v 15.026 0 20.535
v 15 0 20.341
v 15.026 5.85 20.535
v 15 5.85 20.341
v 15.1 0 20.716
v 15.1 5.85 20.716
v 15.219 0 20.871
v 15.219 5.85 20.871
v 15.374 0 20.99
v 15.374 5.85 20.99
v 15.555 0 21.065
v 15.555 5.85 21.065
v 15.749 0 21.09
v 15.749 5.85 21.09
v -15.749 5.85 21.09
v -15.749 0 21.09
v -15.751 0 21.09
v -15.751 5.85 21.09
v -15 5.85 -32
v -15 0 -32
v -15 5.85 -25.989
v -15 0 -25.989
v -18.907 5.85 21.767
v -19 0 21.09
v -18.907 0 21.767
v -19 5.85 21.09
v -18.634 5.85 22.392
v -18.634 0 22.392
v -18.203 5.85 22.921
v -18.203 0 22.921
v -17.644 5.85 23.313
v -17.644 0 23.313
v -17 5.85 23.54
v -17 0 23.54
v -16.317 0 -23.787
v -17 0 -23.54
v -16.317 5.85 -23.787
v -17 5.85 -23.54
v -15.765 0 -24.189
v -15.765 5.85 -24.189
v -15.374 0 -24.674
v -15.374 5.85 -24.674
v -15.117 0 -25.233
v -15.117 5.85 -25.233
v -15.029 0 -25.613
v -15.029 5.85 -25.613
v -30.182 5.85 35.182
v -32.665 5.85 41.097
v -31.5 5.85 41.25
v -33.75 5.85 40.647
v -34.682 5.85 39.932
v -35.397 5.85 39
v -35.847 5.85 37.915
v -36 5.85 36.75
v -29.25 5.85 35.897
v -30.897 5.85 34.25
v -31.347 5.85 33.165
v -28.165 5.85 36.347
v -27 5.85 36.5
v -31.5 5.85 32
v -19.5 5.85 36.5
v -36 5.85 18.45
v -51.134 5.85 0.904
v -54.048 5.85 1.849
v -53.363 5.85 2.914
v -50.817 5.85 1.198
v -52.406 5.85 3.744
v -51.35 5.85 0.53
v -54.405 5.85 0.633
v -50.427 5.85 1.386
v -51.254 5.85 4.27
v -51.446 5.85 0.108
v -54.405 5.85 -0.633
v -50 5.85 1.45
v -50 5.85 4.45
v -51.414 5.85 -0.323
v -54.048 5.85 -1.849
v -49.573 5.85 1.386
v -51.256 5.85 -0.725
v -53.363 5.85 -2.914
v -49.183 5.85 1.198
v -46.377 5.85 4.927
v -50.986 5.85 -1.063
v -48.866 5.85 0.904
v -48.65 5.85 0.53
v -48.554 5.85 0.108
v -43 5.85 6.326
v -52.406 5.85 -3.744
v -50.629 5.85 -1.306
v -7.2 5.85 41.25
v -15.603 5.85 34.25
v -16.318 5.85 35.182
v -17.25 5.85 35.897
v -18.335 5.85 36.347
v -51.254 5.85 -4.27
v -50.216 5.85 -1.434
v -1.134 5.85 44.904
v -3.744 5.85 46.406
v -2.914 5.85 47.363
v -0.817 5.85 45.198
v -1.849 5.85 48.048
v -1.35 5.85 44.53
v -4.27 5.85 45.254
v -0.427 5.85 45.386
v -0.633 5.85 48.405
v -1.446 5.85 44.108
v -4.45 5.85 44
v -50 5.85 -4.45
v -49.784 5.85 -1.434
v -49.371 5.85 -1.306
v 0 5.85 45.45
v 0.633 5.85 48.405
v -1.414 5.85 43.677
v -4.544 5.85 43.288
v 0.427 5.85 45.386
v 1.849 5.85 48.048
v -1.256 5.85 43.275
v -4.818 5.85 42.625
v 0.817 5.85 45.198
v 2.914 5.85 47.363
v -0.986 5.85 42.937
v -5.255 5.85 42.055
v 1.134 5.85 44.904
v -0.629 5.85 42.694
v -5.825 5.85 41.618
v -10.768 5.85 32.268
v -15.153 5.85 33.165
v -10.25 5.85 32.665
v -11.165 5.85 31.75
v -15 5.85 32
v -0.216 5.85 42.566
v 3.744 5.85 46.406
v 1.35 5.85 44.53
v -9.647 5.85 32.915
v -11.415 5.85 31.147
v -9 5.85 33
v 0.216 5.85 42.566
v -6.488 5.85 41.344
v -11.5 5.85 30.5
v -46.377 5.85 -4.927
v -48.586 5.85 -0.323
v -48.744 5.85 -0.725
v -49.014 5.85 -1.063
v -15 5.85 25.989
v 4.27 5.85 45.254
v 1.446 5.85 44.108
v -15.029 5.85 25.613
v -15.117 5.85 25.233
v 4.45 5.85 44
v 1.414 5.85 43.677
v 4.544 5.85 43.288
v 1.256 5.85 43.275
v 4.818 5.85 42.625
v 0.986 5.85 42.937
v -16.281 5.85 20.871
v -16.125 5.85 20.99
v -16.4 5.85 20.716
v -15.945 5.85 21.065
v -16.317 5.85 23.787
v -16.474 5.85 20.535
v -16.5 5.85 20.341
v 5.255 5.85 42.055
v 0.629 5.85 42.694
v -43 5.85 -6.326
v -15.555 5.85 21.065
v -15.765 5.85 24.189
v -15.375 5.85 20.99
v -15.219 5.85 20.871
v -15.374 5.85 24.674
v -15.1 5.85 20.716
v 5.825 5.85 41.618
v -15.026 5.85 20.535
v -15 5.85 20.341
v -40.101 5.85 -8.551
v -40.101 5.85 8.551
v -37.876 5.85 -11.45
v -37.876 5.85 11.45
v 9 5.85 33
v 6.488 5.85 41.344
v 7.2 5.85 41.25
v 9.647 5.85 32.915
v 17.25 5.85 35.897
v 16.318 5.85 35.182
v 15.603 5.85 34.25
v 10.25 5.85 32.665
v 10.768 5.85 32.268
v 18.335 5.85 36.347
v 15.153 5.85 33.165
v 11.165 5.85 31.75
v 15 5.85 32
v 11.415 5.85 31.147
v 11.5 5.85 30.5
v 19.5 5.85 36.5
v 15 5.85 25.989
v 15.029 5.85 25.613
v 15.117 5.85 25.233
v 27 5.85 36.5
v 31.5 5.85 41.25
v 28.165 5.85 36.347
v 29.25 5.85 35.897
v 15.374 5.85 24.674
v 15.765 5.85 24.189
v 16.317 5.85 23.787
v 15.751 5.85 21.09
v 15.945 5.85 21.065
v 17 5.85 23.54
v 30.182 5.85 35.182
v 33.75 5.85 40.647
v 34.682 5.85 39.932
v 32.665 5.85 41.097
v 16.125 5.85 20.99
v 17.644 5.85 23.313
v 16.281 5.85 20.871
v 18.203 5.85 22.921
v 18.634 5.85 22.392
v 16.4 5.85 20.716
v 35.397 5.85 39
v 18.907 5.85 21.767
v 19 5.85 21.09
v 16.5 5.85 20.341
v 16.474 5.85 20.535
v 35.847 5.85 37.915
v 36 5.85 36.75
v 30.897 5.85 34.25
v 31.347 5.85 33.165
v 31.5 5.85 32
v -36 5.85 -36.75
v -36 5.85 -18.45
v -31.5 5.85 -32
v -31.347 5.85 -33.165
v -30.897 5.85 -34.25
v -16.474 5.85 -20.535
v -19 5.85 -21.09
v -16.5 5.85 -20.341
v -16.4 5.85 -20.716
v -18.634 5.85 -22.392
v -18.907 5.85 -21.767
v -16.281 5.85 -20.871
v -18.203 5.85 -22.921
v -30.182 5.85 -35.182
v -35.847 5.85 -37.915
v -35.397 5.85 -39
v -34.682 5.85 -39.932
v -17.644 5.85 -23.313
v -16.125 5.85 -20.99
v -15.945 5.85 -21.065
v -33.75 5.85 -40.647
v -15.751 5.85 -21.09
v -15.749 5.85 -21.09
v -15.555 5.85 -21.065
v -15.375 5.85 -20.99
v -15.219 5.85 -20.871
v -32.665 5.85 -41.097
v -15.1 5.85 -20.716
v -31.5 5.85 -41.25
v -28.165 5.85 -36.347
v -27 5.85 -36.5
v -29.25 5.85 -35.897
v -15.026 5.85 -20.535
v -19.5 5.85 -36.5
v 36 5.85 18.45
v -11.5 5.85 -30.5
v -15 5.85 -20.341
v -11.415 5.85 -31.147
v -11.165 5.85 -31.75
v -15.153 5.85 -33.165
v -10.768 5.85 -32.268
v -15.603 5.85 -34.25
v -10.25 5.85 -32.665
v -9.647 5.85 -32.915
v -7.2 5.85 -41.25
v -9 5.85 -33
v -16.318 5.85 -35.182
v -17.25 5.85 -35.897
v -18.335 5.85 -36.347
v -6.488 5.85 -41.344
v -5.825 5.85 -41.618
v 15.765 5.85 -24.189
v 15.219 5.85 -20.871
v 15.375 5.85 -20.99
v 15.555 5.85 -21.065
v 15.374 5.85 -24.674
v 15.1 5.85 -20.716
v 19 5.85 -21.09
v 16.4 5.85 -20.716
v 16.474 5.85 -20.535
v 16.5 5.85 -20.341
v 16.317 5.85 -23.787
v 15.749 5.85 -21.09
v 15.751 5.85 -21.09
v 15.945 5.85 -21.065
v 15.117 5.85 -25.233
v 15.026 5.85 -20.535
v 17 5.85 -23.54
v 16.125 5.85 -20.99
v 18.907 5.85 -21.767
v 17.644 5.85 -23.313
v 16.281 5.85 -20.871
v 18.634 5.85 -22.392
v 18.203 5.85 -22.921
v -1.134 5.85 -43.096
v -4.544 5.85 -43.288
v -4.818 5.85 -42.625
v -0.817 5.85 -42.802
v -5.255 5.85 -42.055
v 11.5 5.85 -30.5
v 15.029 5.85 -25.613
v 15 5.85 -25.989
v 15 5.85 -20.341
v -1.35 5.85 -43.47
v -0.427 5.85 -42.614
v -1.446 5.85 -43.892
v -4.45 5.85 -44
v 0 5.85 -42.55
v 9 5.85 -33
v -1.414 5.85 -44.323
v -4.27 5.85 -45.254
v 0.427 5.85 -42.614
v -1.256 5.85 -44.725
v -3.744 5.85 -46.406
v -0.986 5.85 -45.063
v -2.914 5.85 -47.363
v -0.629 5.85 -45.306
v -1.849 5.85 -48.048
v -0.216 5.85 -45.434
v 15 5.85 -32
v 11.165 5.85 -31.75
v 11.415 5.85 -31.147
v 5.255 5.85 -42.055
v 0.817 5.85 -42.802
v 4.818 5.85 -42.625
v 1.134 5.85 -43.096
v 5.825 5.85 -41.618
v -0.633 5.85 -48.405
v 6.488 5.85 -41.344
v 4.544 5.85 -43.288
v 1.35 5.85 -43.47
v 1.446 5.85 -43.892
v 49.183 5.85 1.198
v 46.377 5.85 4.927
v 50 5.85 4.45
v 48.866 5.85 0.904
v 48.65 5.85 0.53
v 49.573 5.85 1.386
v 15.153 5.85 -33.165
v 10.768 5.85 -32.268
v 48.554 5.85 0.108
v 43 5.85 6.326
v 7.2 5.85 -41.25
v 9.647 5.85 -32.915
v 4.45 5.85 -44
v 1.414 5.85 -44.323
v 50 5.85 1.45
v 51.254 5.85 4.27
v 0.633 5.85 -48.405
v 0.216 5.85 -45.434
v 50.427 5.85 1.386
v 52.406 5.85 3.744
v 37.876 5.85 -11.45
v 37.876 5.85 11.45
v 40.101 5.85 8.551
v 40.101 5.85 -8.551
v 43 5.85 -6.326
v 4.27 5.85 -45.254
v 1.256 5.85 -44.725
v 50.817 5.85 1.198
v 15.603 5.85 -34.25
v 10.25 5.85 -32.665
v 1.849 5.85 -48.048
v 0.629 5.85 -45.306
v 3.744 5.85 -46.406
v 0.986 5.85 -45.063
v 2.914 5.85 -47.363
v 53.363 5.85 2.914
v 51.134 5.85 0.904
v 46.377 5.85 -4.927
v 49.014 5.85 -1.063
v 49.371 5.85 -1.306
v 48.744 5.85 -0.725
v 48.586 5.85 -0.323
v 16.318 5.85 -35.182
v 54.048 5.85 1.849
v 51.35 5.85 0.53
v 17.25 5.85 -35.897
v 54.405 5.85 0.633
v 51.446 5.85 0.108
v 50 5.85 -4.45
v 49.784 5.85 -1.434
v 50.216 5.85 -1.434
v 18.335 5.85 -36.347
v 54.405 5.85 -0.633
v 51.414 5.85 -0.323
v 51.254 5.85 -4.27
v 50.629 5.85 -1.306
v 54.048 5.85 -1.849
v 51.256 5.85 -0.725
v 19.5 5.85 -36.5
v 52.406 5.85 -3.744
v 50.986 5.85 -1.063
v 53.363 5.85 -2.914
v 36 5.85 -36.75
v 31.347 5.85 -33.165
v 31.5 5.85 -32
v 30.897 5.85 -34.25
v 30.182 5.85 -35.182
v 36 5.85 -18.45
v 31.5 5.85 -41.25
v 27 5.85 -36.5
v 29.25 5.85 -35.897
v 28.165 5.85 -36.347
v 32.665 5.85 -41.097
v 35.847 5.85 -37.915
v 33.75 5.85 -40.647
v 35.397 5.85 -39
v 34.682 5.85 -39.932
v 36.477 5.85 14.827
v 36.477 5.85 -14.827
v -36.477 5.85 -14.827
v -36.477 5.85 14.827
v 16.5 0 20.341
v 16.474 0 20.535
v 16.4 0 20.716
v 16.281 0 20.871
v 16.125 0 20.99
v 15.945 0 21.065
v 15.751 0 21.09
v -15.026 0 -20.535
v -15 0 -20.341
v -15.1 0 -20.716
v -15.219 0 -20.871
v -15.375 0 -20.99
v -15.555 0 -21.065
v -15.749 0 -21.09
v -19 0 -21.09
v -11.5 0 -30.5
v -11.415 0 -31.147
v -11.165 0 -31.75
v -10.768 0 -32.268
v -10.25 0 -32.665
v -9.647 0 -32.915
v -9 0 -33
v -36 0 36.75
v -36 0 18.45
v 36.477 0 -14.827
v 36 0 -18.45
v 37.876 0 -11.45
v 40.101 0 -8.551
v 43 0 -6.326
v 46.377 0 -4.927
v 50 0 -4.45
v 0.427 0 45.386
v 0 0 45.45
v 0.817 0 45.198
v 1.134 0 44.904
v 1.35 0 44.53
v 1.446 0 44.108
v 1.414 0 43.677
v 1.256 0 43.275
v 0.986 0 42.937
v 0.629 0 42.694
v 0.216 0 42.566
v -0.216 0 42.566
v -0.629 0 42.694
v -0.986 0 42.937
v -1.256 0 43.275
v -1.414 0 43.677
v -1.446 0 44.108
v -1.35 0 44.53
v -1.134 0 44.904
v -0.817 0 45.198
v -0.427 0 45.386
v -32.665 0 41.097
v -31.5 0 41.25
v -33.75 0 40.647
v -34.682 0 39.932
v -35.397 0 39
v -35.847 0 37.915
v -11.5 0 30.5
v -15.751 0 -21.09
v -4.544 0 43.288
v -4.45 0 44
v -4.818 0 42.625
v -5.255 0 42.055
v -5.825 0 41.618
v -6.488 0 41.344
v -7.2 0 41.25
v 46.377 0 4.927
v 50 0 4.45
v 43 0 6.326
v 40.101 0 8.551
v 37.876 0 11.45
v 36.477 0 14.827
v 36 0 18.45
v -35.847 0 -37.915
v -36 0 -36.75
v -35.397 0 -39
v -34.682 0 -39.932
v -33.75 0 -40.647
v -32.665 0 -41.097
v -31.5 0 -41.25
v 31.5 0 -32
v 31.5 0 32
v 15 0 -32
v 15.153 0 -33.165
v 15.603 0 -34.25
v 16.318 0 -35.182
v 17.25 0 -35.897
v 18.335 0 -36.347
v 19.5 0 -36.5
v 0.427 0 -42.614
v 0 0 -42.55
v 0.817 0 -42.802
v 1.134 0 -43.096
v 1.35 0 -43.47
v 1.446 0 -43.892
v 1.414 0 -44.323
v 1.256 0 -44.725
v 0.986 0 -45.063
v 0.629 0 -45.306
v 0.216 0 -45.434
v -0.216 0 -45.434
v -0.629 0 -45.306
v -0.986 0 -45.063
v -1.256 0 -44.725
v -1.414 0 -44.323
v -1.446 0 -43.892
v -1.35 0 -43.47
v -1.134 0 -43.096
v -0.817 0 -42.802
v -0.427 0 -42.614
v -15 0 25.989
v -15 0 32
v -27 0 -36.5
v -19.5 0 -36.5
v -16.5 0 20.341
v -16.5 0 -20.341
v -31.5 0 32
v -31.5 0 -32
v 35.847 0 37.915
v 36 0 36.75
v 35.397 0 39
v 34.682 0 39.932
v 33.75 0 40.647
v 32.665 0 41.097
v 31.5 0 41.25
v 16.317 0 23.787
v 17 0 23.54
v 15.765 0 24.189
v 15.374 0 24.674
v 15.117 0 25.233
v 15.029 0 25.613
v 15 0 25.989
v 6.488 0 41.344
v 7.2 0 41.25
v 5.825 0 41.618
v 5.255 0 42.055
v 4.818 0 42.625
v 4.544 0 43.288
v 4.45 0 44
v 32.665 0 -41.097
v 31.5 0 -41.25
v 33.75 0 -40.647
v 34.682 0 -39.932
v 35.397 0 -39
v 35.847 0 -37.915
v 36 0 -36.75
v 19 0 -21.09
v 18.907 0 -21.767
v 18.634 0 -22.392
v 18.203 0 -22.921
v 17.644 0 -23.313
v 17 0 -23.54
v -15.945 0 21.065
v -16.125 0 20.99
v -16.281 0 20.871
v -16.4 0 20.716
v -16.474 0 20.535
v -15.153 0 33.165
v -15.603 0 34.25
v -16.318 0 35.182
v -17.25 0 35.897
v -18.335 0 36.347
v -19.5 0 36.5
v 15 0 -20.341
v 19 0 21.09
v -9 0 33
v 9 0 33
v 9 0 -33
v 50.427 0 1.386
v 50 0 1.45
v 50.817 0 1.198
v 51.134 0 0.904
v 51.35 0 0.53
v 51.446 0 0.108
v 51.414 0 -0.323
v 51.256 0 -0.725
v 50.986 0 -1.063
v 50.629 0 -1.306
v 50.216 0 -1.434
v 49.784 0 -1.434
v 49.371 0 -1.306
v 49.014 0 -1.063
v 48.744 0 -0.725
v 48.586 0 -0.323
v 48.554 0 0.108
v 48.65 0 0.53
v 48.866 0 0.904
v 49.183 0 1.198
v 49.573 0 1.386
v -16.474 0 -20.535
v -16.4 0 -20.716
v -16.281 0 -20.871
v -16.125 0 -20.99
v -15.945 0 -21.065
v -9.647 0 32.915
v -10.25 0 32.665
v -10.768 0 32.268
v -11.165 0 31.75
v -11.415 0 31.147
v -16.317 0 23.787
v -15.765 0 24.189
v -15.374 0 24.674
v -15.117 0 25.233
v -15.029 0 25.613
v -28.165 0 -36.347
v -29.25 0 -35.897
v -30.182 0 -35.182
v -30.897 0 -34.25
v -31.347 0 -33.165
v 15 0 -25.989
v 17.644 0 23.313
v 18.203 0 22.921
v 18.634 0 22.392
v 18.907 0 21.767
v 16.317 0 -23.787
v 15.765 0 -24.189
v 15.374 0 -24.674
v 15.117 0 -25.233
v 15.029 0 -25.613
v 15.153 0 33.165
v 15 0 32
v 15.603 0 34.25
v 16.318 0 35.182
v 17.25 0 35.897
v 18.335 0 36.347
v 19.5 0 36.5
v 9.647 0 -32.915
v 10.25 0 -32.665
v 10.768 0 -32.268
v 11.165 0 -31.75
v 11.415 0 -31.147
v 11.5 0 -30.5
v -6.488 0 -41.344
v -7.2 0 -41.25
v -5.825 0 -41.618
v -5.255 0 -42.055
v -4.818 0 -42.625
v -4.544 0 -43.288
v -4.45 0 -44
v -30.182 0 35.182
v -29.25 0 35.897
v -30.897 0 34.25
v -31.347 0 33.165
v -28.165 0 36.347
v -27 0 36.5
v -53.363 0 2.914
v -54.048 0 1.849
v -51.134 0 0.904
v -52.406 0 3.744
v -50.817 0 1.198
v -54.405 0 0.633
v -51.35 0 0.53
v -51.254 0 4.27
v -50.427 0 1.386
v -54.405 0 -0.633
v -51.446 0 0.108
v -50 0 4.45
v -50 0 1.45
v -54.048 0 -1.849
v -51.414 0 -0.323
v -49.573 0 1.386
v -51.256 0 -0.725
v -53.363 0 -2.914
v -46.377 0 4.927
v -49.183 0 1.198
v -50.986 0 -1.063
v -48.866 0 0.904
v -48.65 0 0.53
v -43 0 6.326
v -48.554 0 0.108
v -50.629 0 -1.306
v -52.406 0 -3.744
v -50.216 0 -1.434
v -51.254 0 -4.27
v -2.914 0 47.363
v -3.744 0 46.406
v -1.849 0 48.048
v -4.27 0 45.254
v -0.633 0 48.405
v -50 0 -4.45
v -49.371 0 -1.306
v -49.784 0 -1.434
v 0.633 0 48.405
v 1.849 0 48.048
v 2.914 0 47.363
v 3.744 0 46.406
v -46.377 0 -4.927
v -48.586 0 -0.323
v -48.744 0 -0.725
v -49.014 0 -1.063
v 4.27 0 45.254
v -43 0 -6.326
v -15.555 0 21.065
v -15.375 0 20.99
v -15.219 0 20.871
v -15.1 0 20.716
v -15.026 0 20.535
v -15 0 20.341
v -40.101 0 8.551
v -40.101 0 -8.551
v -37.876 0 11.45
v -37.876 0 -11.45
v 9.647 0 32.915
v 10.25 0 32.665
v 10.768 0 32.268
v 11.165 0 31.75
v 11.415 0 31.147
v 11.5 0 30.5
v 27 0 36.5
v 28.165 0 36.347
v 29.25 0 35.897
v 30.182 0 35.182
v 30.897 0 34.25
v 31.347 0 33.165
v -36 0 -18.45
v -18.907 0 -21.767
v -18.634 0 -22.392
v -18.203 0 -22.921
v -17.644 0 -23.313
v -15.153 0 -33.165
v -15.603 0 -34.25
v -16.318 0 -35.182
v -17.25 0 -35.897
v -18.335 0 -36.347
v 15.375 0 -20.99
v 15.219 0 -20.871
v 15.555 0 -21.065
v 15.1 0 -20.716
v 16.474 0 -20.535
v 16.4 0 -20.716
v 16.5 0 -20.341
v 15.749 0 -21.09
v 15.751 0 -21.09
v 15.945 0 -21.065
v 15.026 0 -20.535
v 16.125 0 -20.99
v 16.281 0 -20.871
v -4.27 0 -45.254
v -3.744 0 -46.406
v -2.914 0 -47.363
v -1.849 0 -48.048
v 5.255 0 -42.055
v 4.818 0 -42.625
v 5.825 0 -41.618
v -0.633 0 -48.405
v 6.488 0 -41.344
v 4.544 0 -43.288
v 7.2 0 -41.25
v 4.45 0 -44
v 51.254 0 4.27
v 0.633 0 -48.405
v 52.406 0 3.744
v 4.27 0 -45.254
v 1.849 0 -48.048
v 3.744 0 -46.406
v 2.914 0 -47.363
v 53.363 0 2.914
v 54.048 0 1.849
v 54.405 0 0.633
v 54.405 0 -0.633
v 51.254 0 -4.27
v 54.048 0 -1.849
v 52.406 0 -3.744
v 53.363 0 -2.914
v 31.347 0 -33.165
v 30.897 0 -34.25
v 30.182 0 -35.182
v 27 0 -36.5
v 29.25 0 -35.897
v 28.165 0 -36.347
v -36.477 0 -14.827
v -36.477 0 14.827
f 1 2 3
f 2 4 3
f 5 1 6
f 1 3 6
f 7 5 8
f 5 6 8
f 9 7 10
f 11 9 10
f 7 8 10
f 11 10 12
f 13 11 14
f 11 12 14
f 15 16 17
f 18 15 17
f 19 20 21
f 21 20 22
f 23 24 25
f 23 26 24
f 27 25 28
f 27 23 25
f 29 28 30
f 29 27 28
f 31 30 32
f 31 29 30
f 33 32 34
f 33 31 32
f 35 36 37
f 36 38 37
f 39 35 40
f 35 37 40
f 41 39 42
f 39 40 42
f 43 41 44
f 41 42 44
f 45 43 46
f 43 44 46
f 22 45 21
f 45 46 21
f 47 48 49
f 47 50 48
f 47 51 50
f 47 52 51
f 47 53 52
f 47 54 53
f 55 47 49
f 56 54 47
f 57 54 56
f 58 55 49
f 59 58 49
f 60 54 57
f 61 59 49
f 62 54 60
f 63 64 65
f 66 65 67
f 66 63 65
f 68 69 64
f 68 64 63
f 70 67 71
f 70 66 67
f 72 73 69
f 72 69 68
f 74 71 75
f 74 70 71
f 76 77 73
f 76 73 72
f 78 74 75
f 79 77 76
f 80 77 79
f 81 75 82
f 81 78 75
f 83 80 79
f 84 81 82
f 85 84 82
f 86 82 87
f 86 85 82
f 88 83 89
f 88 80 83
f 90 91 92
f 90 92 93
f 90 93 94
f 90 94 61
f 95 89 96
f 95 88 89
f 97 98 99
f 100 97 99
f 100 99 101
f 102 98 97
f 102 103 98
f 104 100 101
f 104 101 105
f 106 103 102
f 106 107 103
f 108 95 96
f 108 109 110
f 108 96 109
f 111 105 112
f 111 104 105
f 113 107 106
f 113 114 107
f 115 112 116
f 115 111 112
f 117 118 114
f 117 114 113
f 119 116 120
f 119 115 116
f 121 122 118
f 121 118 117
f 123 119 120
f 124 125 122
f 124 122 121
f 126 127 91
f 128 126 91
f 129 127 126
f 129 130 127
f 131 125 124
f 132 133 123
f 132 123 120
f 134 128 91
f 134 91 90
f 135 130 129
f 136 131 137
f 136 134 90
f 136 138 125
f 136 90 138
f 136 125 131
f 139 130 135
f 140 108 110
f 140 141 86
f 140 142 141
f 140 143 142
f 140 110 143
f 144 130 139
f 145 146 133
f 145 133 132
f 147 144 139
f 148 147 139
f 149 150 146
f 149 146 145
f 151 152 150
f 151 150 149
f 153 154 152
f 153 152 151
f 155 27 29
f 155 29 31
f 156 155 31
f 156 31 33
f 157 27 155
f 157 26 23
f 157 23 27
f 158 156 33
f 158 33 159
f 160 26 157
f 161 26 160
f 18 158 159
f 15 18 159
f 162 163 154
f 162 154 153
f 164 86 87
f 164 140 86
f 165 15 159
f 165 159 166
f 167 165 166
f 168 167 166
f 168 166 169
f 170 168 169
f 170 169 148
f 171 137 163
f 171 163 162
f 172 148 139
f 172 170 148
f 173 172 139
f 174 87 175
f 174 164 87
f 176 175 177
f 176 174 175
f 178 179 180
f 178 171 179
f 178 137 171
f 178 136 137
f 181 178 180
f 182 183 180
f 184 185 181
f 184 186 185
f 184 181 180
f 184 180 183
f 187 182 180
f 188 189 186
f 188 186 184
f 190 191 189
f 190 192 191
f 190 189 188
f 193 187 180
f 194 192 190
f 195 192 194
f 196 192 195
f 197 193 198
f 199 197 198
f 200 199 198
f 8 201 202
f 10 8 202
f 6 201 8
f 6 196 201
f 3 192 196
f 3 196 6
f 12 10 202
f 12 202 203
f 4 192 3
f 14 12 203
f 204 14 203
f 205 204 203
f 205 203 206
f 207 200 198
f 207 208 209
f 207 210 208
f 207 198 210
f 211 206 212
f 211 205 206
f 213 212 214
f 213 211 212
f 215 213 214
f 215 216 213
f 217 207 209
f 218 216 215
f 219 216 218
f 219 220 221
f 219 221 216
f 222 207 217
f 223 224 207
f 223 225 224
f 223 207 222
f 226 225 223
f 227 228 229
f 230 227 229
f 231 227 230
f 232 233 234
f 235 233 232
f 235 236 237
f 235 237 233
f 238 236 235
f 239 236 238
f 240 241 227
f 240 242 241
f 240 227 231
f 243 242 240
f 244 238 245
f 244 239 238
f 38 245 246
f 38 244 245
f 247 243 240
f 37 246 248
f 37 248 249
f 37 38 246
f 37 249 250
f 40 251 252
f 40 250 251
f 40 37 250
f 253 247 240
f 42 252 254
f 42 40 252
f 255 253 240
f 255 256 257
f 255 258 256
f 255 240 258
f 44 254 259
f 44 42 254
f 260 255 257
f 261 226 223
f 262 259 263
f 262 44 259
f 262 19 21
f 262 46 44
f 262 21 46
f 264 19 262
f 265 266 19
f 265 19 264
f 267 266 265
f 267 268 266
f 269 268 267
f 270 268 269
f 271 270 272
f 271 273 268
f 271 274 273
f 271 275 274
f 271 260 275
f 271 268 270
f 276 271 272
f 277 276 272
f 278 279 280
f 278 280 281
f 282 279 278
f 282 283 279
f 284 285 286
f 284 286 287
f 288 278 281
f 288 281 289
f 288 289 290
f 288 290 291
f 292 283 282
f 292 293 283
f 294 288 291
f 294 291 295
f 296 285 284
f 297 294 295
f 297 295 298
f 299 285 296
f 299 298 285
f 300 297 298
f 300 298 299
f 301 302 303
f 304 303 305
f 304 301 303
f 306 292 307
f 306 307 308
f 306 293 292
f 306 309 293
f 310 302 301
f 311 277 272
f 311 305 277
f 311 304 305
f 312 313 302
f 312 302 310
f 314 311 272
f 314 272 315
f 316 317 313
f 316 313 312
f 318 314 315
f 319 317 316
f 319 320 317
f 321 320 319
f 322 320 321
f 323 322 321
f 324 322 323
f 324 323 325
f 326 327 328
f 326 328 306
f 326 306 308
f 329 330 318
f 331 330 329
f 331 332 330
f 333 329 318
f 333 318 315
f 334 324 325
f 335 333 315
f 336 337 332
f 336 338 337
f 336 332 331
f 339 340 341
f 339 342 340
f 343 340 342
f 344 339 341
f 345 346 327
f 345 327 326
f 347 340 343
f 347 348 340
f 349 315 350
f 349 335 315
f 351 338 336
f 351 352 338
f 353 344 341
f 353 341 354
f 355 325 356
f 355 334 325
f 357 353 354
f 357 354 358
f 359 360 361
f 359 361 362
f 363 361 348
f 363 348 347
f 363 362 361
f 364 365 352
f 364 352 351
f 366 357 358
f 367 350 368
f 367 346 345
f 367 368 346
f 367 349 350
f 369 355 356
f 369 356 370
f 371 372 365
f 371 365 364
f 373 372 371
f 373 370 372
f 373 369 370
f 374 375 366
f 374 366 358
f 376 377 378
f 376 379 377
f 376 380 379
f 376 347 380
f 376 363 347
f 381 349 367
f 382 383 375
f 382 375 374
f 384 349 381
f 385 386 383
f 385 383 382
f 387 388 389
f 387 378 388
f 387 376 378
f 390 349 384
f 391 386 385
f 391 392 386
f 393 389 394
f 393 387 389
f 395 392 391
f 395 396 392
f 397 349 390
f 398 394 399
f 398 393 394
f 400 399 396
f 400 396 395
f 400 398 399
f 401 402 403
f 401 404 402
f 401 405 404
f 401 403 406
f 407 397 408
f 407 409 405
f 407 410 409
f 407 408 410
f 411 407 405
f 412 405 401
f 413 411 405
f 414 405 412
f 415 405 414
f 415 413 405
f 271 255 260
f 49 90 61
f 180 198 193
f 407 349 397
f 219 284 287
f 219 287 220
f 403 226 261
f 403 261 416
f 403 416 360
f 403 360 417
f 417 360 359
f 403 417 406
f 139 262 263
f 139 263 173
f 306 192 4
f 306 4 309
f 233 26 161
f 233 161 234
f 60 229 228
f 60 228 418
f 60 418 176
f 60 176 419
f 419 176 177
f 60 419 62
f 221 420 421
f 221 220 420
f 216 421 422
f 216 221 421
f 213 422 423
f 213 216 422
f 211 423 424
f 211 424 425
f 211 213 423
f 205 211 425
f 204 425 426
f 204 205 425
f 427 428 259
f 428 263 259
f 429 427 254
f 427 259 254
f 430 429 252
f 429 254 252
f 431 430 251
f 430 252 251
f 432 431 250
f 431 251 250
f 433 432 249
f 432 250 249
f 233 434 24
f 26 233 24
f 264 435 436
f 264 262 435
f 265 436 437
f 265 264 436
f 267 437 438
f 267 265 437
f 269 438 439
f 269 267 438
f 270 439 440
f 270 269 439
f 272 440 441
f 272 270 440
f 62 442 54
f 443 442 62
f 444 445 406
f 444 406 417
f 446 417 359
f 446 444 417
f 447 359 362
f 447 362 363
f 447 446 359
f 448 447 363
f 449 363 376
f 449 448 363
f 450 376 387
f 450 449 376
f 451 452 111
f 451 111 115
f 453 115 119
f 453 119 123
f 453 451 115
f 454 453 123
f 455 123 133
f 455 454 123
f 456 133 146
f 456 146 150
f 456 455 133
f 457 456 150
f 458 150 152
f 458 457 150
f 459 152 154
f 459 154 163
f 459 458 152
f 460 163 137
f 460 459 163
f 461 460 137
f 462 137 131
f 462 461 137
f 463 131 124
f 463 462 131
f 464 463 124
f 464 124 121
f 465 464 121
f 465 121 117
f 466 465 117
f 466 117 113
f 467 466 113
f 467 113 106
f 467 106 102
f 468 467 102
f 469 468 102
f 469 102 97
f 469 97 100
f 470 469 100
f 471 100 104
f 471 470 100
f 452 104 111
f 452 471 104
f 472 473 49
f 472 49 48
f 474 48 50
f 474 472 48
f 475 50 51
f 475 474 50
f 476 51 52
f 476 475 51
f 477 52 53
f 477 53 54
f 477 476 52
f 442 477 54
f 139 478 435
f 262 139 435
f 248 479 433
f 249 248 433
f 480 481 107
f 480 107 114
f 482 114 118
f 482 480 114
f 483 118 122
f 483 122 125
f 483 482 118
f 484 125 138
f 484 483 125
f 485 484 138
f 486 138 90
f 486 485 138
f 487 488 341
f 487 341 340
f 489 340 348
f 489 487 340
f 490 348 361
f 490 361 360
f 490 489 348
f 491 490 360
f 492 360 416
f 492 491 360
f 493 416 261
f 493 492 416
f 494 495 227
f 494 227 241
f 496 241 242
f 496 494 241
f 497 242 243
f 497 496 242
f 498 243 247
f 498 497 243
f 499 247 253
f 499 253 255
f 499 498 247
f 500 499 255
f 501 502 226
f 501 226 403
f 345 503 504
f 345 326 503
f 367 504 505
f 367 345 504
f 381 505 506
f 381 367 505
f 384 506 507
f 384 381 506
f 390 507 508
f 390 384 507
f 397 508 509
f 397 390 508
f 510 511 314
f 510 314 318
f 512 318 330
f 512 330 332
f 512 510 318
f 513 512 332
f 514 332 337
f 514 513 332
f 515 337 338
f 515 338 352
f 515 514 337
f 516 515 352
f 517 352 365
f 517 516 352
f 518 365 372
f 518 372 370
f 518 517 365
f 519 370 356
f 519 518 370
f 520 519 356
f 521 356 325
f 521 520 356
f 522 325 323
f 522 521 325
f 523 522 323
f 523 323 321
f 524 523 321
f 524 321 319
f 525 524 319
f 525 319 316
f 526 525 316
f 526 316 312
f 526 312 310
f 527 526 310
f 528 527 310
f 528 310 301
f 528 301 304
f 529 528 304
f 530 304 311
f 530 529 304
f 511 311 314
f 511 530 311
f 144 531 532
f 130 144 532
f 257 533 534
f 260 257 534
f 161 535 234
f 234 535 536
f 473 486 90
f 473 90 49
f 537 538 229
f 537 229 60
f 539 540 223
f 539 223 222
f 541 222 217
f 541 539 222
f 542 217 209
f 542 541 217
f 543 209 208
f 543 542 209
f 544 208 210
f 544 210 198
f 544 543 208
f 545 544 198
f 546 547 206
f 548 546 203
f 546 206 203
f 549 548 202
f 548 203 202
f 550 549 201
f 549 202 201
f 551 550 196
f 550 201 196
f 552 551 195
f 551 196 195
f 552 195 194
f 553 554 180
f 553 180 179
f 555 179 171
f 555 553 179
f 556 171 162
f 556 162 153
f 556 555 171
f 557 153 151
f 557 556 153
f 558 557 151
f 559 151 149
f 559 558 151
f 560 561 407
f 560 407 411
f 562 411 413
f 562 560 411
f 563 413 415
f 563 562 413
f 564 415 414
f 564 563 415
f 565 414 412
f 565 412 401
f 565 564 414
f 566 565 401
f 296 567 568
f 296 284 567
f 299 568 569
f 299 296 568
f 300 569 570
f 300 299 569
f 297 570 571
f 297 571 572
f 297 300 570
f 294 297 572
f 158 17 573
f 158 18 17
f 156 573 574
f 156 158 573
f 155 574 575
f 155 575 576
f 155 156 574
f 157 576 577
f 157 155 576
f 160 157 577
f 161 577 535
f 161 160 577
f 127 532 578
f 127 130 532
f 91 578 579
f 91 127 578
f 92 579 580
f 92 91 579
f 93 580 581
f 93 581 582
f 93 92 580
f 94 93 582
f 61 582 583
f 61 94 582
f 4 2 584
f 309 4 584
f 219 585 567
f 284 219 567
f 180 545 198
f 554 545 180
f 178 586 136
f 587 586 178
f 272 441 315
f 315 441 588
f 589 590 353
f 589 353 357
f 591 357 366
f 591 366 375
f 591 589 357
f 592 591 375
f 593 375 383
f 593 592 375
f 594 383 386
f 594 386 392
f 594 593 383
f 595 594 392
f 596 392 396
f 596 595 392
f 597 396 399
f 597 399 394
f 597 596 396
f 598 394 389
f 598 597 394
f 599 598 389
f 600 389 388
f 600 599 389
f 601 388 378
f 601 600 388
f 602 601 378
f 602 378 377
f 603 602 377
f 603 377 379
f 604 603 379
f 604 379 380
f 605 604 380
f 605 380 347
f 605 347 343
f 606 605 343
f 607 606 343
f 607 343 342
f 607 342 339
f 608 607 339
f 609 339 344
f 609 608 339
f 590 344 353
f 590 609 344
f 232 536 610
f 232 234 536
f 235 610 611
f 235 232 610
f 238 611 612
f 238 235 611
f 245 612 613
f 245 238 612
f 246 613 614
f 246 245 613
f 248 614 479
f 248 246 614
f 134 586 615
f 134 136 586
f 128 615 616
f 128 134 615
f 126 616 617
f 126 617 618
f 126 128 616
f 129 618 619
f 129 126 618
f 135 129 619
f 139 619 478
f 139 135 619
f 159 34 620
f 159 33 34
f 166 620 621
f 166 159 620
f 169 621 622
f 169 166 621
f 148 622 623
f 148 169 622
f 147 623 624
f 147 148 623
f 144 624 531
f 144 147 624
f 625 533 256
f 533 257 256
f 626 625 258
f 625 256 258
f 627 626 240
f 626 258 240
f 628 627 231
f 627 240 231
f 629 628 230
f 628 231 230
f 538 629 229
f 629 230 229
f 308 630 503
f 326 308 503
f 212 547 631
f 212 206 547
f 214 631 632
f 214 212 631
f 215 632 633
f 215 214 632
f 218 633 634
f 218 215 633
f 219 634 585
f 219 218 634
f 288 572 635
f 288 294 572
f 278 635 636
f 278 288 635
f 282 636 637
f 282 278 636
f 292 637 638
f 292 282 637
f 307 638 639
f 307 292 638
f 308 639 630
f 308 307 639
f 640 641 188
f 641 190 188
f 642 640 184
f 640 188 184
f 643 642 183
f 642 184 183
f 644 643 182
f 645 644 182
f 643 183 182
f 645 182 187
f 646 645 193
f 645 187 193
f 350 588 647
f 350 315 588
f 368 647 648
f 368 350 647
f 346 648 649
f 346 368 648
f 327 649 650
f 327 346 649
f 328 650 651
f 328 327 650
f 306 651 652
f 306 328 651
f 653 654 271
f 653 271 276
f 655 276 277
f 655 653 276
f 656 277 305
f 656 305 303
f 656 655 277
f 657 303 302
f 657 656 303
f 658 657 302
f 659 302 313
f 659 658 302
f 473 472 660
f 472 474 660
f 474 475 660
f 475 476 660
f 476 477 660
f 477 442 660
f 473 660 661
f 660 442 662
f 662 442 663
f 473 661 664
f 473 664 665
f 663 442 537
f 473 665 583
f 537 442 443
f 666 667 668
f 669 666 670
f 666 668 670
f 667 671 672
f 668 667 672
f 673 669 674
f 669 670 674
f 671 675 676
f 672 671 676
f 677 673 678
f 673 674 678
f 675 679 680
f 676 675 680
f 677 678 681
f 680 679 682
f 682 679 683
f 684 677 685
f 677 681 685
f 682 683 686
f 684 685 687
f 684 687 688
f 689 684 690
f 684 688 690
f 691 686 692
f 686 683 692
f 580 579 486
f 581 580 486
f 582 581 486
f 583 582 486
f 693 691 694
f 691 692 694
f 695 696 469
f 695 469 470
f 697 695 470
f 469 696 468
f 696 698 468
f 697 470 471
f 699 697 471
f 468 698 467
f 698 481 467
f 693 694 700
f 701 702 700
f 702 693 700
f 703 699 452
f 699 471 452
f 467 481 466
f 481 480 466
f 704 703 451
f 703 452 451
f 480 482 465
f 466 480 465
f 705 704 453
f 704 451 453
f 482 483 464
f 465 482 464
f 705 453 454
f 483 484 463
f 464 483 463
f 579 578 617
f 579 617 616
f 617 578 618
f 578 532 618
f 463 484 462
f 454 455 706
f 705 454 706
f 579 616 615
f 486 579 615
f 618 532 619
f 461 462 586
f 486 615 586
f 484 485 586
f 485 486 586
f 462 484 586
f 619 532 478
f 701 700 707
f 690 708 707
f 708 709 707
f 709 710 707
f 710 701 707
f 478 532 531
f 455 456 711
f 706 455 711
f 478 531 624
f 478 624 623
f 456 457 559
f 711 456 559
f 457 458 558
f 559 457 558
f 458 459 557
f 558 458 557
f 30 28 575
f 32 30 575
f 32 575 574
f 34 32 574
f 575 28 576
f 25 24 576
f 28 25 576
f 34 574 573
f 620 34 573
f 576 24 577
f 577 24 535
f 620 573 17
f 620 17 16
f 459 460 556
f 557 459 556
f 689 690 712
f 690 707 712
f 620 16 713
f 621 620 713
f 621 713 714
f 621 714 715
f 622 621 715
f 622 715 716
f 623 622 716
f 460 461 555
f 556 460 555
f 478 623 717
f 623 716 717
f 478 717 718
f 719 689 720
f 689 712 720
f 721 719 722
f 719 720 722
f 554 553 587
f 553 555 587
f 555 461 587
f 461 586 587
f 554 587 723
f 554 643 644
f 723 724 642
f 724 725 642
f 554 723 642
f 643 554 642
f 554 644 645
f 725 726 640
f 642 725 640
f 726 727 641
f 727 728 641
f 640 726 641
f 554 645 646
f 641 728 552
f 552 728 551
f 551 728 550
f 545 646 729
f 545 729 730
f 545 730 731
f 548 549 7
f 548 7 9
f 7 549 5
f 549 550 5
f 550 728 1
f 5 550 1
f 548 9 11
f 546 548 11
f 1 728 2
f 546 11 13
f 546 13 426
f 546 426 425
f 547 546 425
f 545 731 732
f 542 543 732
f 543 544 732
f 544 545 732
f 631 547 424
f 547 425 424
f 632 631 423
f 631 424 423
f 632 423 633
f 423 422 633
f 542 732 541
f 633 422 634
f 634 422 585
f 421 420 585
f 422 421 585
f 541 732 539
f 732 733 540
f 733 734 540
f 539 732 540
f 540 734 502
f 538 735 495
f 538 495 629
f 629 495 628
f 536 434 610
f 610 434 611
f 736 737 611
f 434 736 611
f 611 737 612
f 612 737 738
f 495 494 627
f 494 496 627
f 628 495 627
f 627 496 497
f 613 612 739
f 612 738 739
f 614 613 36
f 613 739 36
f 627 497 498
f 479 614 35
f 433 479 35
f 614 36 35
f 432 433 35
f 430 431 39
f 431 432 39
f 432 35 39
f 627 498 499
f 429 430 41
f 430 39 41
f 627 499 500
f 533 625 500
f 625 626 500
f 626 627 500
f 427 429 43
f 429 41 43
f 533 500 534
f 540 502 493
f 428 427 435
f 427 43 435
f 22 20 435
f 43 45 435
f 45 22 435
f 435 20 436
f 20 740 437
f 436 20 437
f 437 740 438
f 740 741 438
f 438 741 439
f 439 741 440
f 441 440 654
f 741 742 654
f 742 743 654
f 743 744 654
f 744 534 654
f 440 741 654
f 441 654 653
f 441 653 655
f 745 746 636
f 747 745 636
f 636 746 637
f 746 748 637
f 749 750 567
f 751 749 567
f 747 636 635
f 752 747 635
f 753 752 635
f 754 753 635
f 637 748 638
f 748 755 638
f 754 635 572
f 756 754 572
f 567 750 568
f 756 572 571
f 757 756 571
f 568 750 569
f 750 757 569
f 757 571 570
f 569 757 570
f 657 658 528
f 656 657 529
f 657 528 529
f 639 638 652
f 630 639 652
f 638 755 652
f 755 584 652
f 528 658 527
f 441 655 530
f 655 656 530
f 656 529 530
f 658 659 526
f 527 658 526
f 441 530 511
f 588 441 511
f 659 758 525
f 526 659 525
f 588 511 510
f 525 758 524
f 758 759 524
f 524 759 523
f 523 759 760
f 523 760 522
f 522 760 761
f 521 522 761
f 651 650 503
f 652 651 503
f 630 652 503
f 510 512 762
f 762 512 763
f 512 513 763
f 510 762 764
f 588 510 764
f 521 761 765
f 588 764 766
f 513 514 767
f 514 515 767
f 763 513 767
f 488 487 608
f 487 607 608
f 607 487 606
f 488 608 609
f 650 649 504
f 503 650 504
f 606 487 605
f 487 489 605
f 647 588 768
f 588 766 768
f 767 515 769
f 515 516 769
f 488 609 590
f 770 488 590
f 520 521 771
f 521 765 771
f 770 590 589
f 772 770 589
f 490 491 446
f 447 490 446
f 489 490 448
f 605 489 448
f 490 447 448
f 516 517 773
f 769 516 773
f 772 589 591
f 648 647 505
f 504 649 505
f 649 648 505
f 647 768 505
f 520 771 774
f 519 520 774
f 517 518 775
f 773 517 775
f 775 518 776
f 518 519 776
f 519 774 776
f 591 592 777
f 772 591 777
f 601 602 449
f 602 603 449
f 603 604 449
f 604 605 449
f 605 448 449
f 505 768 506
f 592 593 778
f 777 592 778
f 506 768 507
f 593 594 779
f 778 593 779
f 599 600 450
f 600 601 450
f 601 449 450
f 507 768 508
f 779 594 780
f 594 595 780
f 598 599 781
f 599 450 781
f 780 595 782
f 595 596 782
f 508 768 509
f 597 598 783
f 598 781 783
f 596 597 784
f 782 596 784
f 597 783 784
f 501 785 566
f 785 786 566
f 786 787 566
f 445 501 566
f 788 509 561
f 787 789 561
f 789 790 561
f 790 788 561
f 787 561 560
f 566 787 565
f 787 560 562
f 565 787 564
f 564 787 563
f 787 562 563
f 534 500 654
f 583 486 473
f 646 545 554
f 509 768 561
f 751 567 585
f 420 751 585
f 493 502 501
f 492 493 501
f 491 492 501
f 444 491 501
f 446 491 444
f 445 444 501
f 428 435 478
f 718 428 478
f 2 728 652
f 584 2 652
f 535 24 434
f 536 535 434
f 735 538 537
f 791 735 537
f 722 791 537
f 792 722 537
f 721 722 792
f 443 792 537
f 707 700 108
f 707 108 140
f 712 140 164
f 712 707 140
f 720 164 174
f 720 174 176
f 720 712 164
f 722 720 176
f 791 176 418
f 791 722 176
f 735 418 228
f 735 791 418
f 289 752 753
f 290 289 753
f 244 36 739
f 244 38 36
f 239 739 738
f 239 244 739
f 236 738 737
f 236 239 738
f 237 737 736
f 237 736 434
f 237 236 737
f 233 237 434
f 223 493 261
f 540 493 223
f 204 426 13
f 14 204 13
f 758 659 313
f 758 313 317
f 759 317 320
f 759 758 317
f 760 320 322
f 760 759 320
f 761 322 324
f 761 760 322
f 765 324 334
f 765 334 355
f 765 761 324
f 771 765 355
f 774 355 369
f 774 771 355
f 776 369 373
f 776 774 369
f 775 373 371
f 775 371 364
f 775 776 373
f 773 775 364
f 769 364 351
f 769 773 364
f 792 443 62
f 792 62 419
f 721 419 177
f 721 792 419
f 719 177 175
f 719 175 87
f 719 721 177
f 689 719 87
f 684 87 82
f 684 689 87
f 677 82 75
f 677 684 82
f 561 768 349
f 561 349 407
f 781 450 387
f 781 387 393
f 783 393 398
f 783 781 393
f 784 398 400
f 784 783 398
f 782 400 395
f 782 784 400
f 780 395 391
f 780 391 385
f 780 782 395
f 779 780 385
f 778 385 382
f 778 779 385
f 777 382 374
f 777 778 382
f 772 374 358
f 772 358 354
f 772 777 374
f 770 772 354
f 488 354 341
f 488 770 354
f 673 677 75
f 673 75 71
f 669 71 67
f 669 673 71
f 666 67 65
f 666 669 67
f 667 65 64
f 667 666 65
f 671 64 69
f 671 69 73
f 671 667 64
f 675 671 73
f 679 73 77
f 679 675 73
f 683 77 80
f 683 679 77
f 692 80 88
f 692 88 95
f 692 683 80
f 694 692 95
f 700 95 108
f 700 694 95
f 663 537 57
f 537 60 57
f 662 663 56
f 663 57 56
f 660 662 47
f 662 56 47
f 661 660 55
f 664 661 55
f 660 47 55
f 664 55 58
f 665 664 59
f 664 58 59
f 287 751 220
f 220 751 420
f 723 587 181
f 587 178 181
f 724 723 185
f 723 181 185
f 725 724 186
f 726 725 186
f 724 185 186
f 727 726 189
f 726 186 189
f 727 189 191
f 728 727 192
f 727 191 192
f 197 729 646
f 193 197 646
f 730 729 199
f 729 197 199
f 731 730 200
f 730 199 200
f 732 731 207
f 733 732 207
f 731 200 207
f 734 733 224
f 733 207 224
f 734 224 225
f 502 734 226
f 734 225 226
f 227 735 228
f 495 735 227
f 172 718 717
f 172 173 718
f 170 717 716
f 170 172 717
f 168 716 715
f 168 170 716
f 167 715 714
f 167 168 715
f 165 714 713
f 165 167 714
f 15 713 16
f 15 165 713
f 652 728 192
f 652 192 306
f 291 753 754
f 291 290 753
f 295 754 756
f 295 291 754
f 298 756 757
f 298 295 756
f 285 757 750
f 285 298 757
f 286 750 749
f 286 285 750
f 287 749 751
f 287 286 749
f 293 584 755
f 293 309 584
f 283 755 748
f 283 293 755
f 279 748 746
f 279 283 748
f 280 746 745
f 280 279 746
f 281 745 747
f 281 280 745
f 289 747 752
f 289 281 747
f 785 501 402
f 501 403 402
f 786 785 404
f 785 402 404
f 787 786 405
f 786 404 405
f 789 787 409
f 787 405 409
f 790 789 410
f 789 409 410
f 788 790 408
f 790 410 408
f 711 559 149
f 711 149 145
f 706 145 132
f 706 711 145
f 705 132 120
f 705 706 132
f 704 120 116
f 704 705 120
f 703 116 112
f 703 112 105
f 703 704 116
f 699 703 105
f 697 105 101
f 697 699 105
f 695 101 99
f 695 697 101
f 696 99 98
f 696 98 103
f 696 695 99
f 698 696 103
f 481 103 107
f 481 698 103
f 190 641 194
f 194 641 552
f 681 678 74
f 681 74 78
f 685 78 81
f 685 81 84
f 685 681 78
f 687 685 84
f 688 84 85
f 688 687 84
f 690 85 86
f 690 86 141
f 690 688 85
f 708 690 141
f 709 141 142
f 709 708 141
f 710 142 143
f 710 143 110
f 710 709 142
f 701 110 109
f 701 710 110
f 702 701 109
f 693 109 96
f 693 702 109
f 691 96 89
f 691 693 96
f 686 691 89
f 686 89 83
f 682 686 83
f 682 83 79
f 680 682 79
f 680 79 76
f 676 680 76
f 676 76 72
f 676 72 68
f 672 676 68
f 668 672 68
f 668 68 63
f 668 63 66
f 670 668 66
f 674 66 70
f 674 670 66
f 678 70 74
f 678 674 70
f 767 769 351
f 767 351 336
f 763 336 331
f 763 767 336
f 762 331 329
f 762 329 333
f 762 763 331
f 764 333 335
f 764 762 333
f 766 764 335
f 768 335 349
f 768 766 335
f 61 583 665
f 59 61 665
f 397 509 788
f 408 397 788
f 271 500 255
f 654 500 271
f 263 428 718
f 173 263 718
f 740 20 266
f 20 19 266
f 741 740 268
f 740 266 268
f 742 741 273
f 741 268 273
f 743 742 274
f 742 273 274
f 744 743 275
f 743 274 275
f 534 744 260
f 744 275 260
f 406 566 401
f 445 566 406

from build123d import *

# Parameters (mm, degrees)
SKETCH1_R           = 1.45
SKETCH1_W           = 23
SKETCH1_H           = 66
BOSS_EXTRUDE1_DEPTH = 5.85
FILLET1_R           = 4.5
FILLET2_R           = 0.749
FILLET3_R           = 2.5
FILLET4_R           = 2.5


with BuildPart() as part:
    # Sketch1 → Boss-Extrude1 (new body)
    # profile 1 of 4: a face of its own
    with BuildSketch(Plane(origin=(0, 0, 0), x_dir=(1, 0, 0), z_dir=(0, 1, 0))):
        with BuildLine():
            Line((-31.5, 41.25), (-7.2, 41.25))
            ThreePointArc((-7.2, 41.25), (-5.255456352, 42.055456352), (-4.45, 44))
            ThreePointArc((-4.45, 44), (0, 48.45), (4.45, 44))
            ThreePointArc((4.45, 44), (5.255456352, 42.055456352), (7.2, 41.25))
            Line((7.2, 41.25), (31.5, 41.25))
            ThreePointArc((31.5, 41.25), (34.681980515, 39.931980515), (36, 36.75))
            Line((36, 36.75), (36, 18.45))
            ThreePointArc((36, 18.45), (40.100505063, 8.550505063), (50, 4.45))
            ThreePointArc((50, 4.45), (54.45, 0), (50, -4.45))
            ThreePointArc((50, -4.45), (40.100505063, -8.550505063), (36, -18.45))
            Line((36, -18.45), (36, -36.75))
            ThreePointArc((36, -36.75), (34.681980515, -39.931980515), (31.5, -41.25))
            Line((31.5, -41.25), (7.2, -41.25))
            ThreePointArc((7.2, -41.25), (5.255456352, -42.055456352), (4.45, -44))
            ThreePointArc((4.45, -44), (0, -48.45), (-4.45, -44))
            ThreePointArc((-4.45, -44), (-5.255456352, -42.055456352), (-7.2, -41.25))
            Line((-7.2, -41.25), (-31.5, -41.25))
            ThreePointArc((-31.5, -41.25), (-34.681980515, -39.931980515), (-36, -36.75))
            Line((-36, -36.75), (-36, -18.45))
            ThreePointArc((-36, -18.45), (-40.100505063, -8.550505063), (-50, -4.45))
            ThreePointArc((-50, -4.45), (-54.45, 0), (-50, 4.45))
            ThreePointArc((-50, 4.45), (-40.100505063, 8.550505063), (-36, 18.45))
            Line((-36, 18.45), (-36, 36.75))
            ThreePointArc((-36, 36.75), (-34.681980515, 39.931980515), (-31.5, 41.25))
        make_face()
        with Locations((0, 44)):
            Circle(SKETCH1_R, mode=Mode.SUBTRACT)
        with Locations((0, -44)):
            Circle(SKETCH1_R, mode=Mode.SUBTRACT)
        with Locations((-50, 0)):
            Circle(SKETCH1_R, mode=Mode.SUBTRACT)
        with Locations((50, 0)):
            Circle(SKETCH1_R, mode=Mode.SUBTRACT)
        Polygon((31.5, 36.5), (20.5, 36.5), (-31.5, 36.5), (-31.5, -36.5), (20.5, -36.5), (31.5, -36.5), align=None, mode=Mode.SUBTRACT)
    # profile 2 of 4: a face of its own
    with BuildSketch(Plane(origin=(0, 0, 0), x_dir=(1, 0, 0), z_dir=(0, 1, 0))):
        Polygon((-15, 21.090403907), (-15, 23.590403907), (-19, 23.590403907), (-19, 0), (-19, -23.590403907), (-15, -23.590403907), (-15, -21.090403907), (-16.5, -21.090403907), (-16.5, 0), (-16.5, 21.090403907), align=None)
    # profile 3 of 4: a face of its own
    with BuildSketch(Plane(origin=(0, 0, 0), x_dir=(1, 0, 0), z_dir=(0, 1, 0))):
        Polygon((19, 23.590403907), (15, 23.590403907), (15, 21.090403907), (16.5, 21.090403907), (16.5, 0), (16.5, -21.090403907), (15, -21.090403907), (15, -23.590403907), (19, -23.590403907), (19, 0), align=None)
    # profile 4 of 4: a face of its own
    with BuildSketch(Plane(origin=(0, 0, 0), x_dir=(1, 0, 0), z_dir=(0, 1, 0))):
        Polygon((15, 36.5), (-15, 36.5), (-15, 23.590403907), (-15, 21.090403907), (-15, -21.090403907), (-15, -23.590403907), (-15, -36.5), (15, -36.5), (15, -23.590403907), (15, -21.090403907), (15, 21.090403907), (15, 23.590403907), align=None)
        Rectangle(SKETCH1_W, SKETCH1_H, mode=Mode.SUBTRACT)
    extrude(amount=BOSS_EXTRUDE1_DEPTH)

    # Fillet1
    fillet1_edges = [part.edges().sort_by_distance(p)[0] for p in [
        (15, 2.925, 36.5),
        (31.5, 2.925, 36.5),
        (-15, 2.925, 36.5),
        (31.5, 2.925, -36.5),
        (-15, 2.925, -36.5),
        (15, 2.925, -36.5),
        (-31.5, 2.925, -36.5),
        (-31.5, 2.925, 36.5),
    ]]
    fillet(fillet1_edges, radius=FILLET1_R)

    # Fillet2
    fillet2_edges = [part.edges().sort_by_distance(p)[0] for p in [
        (16.5, 2.925, 21.090403907),
        (15, 2.925, 21.090403907),
        (-15, 2.925, 21.090403907),
        (-16.5, 2.925, 21.090403907),
        (16.5, 2.925, -21.090403907),
        (15, 2.925, -21.090403907),
        (-15, 2.925, -21.090403907),
        (-16.5, 2.925, -21.090403907),
    ]]
    fillet(fillet2_edges, radius=FILLET2_R)

    # Fillet3
    fillet3_edges = [part.edges().sort_by_distance(p)[0] for p in [
        (-19, 2.925, -23.590403907),
        (19, 2.925, -23.590403907),
        (19, 2.925, 23.590403907),
        (-19, 2.925, 23.590403907),
        (11.5, 2.925, 33),
        (-11.5, 2.925, 33),
        (11.5, 2.925, -33),
        (-11.5, 2.925, -33),
    ]]
    fillet(fillet3_edges, radius=FILLET3_R)

    # Fillet4
    fillet4_edges = [part.edges().sort_by_distance(p)[0] for p in [
        (15, 2.925, -23.590403907),
        (-15, 2.925, -23.590403907),
        (15, 2.925, 23.590403907),
        (-15, 2.925, 23.590403907),
    ]]
    fillet(fillet4_edges, radius=FILLET4_R)


solid = part.part
